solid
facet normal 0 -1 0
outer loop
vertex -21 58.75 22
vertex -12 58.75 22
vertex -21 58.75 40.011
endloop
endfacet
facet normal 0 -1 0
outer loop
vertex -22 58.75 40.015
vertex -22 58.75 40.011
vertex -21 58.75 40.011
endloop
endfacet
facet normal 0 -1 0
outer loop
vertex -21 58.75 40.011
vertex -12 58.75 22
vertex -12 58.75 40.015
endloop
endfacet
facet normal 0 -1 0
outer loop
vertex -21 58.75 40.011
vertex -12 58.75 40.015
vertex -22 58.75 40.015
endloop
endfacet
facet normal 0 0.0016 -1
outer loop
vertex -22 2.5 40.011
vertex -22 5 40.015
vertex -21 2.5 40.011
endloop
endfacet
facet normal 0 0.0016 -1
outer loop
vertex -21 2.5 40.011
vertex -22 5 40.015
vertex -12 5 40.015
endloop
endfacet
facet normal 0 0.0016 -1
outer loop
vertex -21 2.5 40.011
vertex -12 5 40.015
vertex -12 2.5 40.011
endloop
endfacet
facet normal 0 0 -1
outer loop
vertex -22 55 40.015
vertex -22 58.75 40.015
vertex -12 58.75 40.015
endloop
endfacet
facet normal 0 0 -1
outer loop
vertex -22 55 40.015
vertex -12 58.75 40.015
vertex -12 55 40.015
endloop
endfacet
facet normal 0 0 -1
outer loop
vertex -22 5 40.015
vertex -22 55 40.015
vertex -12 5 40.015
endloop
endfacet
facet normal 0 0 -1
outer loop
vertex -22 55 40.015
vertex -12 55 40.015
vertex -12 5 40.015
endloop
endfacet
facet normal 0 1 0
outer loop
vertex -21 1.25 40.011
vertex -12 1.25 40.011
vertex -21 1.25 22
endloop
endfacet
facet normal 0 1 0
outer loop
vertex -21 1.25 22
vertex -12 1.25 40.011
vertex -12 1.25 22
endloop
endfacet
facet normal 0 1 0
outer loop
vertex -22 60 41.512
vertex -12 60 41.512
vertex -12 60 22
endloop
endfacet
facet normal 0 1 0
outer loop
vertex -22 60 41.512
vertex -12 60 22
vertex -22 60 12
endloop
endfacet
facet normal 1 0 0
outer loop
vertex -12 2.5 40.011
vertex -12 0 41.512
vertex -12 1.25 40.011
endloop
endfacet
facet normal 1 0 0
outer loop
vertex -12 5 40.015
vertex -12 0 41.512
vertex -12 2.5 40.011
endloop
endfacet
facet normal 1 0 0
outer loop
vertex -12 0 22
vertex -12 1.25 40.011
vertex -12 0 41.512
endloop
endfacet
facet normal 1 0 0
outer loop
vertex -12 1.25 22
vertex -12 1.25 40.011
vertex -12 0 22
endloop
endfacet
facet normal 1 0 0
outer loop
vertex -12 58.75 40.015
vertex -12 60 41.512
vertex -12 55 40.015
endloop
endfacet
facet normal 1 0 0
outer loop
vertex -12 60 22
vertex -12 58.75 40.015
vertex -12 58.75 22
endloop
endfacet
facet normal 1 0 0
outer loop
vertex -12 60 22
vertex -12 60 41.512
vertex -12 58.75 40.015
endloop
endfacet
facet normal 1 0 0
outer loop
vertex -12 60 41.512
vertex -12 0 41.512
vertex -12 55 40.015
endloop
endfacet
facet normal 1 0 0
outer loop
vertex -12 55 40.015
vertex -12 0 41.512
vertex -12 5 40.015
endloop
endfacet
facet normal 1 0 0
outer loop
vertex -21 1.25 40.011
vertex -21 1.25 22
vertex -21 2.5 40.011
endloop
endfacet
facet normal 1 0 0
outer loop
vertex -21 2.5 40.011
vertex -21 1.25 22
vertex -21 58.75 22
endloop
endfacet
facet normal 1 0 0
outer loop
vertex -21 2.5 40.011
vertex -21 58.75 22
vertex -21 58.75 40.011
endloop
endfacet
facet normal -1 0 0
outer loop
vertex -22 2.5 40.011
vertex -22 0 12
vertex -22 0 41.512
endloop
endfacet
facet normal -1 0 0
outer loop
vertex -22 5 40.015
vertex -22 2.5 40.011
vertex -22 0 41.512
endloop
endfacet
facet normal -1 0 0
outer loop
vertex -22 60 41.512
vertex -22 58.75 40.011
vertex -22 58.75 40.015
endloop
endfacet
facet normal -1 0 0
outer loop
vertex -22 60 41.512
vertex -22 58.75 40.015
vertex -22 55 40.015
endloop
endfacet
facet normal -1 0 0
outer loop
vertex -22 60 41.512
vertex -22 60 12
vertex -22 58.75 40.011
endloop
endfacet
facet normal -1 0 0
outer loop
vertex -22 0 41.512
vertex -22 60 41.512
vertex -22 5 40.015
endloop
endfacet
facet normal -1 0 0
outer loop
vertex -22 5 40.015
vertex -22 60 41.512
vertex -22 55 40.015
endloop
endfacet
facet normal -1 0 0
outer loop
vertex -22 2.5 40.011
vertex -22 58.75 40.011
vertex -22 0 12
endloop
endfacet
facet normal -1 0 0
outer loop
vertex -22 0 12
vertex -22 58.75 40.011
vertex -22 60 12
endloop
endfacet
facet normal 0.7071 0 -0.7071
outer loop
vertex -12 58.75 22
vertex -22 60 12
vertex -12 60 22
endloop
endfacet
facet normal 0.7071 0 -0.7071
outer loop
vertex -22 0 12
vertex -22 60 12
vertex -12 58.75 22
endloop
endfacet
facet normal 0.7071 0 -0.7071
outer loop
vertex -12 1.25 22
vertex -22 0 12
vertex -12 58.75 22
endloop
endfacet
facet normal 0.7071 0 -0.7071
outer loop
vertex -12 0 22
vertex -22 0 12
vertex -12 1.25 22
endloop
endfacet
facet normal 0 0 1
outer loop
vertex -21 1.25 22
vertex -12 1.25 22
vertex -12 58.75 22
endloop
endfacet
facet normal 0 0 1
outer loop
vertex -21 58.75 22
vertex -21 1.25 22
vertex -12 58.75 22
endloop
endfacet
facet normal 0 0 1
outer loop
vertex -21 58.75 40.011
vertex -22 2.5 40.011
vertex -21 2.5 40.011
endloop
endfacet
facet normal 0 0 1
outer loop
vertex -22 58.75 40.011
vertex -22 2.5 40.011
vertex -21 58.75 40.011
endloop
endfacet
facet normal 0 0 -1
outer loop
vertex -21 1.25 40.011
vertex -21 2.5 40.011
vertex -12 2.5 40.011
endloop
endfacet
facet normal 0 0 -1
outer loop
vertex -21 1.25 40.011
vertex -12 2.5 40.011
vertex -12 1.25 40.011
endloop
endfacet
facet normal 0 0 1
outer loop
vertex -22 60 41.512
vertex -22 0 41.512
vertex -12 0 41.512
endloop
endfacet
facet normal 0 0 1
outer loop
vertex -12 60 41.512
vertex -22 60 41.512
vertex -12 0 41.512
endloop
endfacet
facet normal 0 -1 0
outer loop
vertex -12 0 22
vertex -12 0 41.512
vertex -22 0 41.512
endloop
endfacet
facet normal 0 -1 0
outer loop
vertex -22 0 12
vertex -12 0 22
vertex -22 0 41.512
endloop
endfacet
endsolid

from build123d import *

# Parameters (mm, degrees)
BOSS_EXTRUDE1_DEPTH = 60
SKETCH4_W           = 10
SKETCH4_H           = 1.497685239
BOSS_EXTRUDE2_DEPTH = 60
SKETCH6_W           = 10
SKETCH6_H           = 18.014625213
BOSS_EXTRUDE3_DEPTH = 5
CUT_EXTRUDE1_DEPTH  = 10
SKETCH8_W           = 18.010643645
SKETCH8_H           = 57.5
BOSS_EXTRUDE4_DEPTH = 1


with BuildPart() as part:
    # Sketch2 → Boss-Extrude1 (new body)
    with BuildSketch(Plane(origin=(0, 0, 0), x_dir=(1, 0, 0), z_dir=(0, 1, 0))):
        Polygon((-22, -22), (-22, -12), (-12, -22), align=None)
    extrude(amount=BOSS_EXTRUDE1_DEPTH)



with BuildPart() as body_2:
    # Sketch4 → Boss-Extrude2 (new body)
    with BuildSketch(Plane.XZ):
        with Locations((-17, 40.763467832)):
            Rectangle(SKETCH4_W, SKETCH4_H)
    extrude(amount=-BOSS_EXTRUDE2_DEPTH)


with BuildPart() as part_1:
    add(part.part)

    add(body_2.part)  # Boss-Extrude3 merges body 2
    # Sketch6 → Boss-Extrude3 (add)
    with BuildSketch(Plane(origin=(0, 0, 0), x_dir=(-1, 0, 0), z_dir=(0, -1, 0))):
        with Locations((17, -31.007312607)):
            Rectangle(SKETCH6_W, SKETCH6_H)
    boss_extrude3 = extrude(amount=-BOSS_EXTRUDE3_DEPTH)

    # Mirror1: Boss-Extrude3 across plane
    add(boss_extrude3.mirror(Plane.ZX.offset(30)))

    # Sketch7 → Cut-Extrude1 (cut)
    with BuildSketch(Plane(origin=(-12, 0, 0), x_dir=(0, 0, -1), z_dir=(1, 0, 0))):
        Polygon((-40.014625213, 55), (-22, 55), (-22, 57.5), (-22, 58.75), (-40.014625213, 58.75), (-40.014625213, 57.5), align=None)
        Polygon((-22, 2.5), (-22, 5), (-40.014625213, 5), (-40.010643645, 2.5), (-40.010643645, 1.25), (-22, 1.25), align=None)
    extrude(amount=-CUT_EXTRUDE1_DEPTH, mode=Mode.SUBTRACT)

    # Sketch8 → Boss-Extrude4 (add)
    with BuildSketch(Plane.ZY.offset(22)):
        with Locations((31.005321823, 30)):
            Rectangle(SKETCH8_W, SKETCH8_H)
    extrude(amount=-BOSS_EXTRUDE4_DEPTH)


solid = part_1.part
